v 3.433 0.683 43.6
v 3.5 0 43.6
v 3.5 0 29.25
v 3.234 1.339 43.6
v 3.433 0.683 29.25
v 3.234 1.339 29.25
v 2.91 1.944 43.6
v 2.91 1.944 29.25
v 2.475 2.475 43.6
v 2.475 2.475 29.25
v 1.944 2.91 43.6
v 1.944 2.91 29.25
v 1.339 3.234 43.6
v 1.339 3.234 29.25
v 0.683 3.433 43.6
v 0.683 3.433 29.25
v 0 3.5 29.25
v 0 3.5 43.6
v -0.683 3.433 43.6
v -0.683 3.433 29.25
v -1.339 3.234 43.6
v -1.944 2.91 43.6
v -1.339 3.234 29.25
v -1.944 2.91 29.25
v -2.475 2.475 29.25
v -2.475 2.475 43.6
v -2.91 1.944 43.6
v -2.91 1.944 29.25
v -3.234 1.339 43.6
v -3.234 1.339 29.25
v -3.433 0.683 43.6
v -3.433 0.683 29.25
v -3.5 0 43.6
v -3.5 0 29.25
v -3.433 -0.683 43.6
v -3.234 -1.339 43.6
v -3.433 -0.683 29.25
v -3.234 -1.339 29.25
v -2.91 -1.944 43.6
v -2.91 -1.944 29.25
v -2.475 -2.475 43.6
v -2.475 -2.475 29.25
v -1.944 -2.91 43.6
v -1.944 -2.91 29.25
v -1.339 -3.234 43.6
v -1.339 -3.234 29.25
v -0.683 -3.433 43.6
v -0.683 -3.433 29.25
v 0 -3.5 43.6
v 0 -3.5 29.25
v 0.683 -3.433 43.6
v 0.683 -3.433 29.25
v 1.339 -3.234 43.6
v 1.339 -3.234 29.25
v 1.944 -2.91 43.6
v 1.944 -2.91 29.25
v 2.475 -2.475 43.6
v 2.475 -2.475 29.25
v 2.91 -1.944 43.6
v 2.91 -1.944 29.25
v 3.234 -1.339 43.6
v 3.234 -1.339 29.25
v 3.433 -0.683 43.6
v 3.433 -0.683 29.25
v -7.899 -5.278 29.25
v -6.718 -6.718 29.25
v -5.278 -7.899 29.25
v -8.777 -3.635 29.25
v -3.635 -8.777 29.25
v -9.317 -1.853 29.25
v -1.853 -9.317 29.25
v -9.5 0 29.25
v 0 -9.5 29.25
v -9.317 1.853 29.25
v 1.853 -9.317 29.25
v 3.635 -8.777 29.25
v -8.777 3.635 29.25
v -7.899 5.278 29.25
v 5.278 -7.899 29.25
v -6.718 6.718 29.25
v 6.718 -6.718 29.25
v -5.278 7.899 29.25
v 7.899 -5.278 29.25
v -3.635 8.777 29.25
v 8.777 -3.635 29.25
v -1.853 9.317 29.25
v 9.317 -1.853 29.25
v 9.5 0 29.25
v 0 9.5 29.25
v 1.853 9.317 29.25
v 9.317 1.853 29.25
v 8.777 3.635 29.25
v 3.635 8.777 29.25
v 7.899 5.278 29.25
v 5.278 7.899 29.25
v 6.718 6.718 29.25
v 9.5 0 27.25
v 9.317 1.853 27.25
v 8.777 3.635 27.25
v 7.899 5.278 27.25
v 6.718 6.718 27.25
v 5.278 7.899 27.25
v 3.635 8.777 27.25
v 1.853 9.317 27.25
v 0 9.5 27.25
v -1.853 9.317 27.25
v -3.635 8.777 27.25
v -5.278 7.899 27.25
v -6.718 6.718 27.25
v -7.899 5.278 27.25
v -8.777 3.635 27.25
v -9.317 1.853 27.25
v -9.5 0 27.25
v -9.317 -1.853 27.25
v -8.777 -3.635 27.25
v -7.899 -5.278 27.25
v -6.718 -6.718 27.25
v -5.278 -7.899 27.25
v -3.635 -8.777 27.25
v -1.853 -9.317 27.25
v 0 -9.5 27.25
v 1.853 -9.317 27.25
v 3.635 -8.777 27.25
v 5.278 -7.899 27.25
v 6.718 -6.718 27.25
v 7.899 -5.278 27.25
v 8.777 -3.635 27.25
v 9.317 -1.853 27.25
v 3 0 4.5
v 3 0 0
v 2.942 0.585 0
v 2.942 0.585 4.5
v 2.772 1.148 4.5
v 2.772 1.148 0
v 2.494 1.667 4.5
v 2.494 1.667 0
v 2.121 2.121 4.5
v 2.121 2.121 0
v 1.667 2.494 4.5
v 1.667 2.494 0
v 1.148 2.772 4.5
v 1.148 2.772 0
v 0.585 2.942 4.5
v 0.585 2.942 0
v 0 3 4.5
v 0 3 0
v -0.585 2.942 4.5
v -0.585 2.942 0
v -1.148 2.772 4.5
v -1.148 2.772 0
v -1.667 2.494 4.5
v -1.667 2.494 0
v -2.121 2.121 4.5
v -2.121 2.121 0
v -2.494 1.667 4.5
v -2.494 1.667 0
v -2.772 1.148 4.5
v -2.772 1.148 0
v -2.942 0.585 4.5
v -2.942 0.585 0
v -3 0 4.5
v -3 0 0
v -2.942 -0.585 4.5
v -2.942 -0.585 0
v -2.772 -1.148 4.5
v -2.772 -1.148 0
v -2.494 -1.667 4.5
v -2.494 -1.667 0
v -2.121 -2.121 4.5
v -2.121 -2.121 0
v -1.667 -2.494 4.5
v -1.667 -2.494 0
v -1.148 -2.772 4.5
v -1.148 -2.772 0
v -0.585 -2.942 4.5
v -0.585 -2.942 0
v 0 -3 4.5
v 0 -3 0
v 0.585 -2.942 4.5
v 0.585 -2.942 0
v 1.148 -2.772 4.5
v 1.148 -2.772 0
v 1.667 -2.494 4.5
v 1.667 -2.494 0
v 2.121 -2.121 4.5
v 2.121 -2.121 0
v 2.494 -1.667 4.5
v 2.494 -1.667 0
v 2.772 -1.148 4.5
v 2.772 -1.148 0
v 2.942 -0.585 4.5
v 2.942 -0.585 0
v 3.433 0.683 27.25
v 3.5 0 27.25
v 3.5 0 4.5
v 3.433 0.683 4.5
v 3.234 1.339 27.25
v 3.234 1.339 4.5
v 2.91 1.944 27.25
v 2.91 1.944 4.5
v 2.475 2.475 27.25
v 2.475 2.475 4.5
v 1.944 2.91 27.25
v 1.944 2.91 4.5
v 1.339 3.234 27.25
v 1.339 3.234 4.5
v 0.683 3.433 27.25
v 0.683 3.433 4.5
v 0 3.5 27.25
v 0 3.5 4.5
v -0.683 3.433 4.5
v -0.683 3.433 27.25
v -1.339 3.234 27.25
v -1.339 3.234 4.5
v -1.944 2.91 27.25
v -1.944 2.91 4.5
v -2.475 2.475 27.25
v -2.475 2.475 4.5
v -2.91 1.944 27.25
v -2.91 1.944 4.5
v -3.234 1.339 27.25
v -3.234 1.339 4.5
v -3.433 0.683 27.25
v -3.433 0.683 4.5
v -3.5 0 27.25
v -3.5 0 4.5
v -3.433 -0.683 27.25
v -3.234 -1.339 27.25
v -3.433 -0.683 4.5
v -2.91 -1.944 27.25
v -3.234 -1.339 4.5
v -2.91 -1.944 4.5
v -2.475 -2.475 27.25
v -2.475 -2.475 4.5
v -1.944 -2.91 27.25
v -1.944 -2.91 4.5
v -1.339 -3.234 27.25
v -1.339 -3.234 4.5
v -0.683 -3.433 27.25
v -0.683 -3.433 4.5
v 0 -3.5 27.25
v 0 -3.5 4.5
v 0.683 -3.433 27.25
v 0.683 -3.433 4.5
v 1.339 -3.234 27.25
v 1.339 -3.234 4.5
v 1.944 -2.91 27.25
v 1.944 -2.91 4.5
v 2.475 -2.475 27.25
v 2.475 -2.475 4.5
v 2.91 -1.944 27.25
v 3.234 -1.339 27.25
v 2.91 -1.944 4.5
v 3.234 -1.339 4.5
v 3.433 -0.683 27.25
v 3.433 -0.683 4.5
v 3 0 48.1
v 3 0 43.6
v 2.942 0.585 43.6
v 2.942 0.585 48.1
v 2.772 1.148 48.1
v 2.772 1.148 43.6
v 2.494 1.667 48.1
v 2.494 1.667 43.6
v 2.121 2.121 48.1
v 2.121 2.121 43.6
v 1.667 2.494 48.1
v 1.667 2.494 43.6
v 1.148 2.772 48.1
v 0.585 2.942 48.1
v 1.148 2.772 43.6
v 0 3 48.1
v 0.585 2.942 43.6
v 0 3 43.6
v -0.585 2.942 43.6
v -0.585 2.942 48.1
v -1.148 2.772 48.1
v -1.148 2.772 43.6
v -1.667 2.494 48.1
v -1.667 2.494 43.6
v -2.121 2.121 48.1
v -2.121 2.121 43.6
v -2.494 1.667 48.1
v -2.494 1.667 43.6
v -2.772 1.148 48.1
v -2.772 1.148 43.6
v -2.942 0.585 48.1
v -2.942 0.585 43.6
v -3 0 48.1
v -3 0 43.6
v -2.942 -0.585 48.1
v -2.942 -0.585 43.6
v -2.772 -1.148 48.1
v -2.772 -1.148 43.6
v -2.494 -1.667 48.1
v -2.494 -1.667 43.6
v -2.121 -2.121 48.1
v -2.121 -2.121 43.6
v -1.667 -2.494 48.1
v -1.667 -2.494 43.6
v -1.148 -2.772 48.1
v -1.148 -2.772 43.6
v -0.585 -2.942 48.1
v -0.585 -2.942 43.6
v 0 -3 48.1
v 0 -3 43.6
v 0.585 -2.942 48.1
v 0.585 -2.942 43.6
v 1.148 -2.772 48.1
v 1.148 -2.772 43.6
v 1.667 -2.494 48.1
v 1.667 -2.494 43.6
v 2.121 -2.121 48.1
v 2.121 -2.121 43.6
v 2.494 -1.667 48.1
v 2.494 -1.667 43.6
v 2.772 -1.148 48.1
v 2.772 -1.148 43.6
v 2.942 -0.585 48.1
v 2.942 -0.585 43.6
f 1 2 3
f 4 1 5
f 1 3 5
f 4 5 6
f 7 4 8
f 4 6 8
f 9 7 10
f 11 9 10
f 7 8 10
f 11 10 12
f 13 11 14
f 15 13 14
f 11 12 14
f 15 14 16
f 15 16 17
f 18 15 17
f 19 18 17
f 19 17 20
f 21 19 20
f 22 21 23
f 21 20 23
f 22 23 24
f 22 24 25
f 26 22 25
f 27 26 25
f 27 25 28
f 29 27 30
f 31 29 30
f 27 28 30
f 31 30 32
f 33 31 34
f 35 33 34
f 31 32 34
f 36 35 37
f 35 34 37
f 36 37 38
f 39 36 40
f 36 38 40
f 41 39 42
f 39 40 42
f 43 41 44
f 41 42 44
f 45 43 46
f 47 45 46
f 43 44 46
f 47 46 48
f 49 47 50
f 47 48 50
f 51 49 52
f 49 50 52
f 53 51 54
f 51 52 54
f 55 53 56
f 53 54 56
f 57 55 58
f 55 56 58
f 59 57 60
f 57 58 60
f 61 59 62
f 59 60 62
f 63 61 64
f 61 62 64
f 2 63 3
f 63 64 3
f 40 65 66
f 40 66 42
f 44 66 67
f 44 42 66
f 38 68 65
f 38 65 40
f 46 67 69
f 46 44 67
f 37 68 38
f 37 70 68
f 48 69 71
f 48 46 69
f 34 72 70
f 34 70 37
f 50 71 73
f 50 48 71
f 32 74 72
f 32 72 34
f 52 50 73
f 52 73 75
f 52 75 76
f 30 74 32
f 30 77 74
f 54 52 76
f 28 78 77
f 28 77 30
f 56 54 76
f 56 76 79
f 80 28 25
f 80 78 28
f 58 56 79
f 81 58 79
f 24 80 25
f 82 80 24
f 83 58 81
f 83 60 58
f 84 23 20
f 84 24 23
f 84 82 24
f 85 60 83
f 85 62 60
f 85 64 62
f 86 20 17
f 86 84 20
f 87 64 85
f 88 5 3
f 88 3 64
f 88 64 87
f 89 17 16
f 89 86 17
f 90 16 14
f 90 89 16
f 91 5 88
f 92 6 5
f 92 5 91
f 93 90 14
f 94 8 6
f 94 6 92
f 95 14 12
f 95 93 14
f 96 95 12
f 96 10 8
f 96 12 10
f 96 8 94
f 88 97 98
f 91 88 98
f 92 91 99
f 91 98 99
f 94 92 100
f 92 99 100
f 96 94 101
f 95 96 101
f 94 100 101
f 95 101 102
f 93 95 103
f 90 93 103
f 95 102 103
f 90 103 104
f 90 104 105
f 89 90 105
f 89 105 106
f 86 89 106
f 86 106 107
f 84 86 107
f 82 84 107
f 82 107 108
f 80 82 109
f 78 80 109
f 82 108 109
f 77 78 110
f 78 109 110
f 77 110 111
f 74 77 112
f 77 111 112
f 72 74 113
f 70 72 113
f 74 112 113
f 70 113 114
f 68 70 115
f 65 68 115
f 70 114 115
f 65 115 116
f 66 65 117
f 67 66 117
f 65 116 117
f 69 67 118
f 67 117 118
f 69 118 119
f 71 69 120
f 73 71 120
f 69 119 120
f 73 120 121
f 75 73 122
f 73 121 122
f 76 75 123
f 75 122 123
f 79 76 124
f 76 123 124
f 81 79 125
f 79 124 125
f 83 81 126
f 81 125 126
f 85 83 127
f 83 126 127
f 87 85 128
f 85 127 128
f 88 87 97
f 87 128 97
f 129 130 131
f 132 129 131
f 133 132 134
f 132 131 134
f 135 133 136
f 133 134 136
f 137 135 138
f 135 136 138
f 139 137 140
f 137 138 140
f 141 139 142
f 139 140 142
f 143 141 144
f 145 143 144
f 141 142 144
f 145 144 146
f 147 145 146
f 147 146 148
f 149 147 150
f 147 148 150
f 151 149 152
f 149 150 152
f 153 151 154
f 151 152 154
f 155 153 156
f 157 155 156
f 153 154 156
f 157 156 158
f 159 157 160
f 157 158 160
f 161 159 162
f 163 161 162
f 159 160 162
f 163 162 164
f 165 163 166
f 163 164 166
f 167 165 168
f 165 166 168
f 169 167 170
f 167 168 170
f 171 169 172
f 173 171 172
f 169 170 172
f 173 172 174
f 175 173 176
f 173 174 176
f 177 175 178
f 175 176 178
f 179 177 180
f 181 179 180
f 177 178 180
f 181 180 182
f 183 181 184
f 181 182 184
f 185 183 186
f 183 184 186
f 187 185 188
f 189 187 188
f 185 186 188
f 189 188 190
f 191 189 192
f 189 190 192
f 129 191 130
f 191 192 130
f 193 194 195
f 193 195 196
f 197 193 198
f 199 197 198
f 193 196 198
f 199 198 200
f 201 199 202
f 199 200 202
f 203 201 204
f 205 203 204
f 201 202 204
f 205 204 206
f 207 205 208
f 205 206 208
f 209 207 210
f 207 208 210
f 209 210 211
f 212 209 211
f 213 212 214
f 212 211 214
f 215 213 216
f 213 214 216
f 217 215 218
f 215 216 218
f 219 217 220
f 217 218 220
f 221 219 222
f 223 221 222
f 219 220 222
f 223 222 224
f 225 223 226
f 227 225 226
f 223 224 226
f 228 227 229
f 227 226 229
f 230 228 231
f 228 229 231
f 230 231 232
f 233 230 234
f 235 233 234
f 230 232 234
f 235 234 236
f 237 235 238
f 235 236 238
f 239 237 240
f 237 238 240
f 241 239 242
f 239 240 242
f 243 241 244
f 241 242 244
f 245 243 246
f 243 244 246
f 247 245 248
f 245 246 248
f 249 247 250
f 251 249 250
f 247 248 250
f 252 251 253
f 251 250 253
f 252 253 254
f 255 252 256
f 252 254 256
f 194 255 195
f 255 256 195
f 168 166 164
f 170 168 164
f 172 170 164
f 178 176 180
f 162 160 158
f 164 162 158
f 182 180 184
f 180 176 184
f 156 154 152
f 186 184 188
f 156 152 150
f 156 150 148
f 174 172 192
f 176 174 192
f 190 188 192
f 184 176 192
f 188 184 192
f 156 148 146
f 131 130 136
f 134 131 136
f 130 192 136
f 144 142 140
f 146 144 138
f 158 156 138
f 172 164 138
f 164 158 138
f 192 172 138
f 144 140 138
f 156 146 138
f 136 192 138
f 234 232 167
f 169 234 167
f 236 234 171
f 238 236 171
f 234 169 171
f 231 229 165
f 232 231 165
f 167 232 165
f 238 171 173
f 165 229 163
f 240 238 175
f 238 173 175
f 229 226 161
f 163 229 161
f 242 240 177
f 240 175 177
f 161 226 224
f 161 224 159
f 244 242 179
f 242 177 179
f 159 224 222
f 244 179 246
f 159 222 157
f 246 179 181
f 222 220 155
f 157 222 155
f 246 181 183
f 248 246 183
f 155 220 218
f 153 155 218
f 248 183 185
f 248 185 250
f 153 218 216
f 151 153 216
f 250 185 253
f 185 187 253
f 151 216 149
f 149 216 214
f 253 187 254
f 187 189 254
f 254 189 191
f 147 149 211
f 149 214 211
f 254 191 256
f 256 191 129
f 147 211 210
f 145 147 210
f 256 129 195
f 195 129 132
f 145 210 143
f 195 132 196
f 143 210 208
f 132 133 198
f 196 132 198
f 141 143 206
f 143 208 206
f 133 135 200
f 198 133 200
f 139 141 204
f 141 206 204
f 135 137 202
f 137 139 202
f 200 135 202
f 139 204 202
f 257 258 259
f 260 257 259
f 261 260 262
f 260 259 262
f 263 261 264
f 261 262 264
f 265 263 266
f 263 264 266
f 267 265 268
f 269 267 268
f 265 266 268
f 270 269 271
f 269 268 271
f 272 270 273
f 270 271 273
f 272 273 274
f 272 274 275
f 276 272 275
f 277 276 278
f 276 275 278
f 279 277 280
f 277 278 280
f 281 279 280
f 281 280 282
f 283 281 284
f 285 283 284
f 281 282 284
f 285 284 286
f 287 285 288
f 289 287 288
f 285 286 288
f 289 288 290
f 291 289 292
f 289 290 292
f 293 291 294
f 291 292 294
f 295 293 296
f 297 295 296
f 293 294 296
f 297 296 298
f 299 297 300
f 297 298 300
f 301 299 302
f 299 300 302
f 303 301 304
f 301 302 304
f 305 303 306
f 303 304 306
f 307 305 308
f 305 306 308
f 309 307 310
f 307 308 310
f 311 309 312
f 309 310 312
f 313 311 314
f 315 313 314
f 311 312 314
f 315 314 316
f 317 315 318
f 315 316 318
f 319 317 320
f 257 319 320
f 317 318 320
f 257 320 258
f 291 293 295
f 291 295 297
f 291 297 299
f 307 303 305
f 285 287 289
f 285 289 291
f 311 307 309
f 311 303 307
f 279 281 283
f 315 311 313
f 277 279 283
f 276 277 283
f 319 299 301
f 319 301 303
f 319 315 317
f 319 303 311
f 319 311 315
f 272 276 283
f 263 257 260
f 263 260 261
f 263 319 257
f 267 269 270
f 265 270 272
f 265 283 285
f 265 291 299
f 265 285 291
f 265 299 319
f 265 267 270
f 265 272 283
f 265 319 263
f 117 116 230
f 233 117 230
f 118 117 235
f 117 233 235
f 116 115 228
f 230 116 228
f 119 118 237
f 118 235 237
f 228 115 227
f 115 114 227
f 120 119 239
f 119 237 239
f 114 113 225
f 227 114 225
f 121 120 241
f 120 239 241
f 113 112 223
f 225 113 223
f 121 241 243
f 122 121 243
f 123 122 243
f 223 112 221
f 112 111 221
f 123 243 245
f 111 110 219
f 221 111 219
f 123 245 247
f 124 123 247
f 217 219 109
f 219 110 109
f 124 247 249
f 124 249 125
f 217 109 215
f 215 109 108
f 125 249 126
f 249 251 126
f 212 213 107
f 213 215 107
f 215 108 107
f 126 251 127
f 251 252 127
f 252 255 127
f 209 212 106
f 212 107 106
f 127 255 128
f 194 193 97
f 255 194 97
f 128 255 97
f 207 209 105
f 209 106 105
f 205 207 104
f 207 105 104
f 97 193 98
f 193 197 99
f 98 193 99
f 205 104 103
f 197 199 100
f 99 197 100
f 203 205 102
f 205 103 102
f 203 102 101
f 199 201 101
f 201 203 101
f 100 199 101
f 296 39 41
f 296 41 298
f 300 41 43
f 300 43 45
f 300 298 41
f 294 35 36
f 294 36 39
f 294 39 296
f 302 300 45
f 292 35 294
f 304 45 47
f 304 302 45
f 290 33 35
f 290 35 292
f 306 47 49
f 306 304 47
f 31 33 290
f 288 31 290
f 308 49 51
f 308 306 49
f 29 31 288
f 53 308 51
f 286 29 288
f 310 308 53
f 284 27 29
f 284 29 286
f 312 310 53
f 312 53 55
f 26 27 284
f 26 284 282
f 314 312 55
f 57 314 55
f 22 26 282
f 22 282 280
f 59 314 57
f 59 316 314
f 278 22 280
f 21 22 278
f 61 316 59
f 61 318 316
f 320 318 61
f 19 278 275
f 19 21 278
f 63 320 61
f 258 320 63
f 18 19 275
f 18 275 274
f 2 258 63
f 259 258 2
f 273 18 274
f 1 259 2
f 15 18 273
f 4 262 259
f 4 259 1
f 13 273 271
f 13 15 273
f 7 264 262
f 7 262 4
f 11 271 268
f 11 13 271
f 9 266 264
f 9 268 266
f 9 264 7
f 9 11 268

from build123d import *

# Parameters (mm, degrees)
CROQUIS1_R              = 3
SALIENTE_EXTRUIR1_DEPTH = 4.5
CROQUIS2_R              = 3.5
SALIENTE_EXTRUIR2_DEPTH = 22.75
CROQUIS3_R              = 9.5
SALIENTE_EXTRUIR3_DEPTH = 2
CROQUIS4_R              = 3.5
SALIENTE_EXTRUIR4_DEPTH = 14.35
CROQUIS5_R              = 3
SALIENTE_EXTRUIR5_DEPTH = 4.5


with BuildPart() as part:
    # Croquis1 → Saliente-Extruir1 (new body)
    with BuildSketch(Plane.XY):
        Circle(CROQUIS1_R)
    extrude(amount=SALIENTE_EXTRUIR1_DEPTH)

    # Croquis2 → Saliente-Extruir2 (add)
    with BuildSketch(Plane.XY.offset(4.5)):
        Circle(CROQUIS2_R)
    extrude(amount=SALIENTE_EXTRUIR2_DEPTH)

    # Croquis3 → Saliente-Extruir3 (add)
    with BuildSketch(Plane.XY.offset(27.25)):
        Circle(CROQUIS3_R)
    extrude(amount=SALIENTE_EXTRUIR3_DEPTH)

    # Croquis4 → Saliente-Extruir4 (add)
    with BuildSketch(Plane.XY.offset(29.25)):
        Circle(CROQUIS4_R)
    extrude(amount=SALIENTE_EXTRUIR4_DEPTH)

    # Croquis5 → Saliente-Extruir5 (add)
    with BuildSketch(Plane.XY.offset(43.6)):
        Circle(CROQUIS5_R)
    extrude(amount=SALIENTE_EXTRUIR5_DEPTH)


solid = part.part
